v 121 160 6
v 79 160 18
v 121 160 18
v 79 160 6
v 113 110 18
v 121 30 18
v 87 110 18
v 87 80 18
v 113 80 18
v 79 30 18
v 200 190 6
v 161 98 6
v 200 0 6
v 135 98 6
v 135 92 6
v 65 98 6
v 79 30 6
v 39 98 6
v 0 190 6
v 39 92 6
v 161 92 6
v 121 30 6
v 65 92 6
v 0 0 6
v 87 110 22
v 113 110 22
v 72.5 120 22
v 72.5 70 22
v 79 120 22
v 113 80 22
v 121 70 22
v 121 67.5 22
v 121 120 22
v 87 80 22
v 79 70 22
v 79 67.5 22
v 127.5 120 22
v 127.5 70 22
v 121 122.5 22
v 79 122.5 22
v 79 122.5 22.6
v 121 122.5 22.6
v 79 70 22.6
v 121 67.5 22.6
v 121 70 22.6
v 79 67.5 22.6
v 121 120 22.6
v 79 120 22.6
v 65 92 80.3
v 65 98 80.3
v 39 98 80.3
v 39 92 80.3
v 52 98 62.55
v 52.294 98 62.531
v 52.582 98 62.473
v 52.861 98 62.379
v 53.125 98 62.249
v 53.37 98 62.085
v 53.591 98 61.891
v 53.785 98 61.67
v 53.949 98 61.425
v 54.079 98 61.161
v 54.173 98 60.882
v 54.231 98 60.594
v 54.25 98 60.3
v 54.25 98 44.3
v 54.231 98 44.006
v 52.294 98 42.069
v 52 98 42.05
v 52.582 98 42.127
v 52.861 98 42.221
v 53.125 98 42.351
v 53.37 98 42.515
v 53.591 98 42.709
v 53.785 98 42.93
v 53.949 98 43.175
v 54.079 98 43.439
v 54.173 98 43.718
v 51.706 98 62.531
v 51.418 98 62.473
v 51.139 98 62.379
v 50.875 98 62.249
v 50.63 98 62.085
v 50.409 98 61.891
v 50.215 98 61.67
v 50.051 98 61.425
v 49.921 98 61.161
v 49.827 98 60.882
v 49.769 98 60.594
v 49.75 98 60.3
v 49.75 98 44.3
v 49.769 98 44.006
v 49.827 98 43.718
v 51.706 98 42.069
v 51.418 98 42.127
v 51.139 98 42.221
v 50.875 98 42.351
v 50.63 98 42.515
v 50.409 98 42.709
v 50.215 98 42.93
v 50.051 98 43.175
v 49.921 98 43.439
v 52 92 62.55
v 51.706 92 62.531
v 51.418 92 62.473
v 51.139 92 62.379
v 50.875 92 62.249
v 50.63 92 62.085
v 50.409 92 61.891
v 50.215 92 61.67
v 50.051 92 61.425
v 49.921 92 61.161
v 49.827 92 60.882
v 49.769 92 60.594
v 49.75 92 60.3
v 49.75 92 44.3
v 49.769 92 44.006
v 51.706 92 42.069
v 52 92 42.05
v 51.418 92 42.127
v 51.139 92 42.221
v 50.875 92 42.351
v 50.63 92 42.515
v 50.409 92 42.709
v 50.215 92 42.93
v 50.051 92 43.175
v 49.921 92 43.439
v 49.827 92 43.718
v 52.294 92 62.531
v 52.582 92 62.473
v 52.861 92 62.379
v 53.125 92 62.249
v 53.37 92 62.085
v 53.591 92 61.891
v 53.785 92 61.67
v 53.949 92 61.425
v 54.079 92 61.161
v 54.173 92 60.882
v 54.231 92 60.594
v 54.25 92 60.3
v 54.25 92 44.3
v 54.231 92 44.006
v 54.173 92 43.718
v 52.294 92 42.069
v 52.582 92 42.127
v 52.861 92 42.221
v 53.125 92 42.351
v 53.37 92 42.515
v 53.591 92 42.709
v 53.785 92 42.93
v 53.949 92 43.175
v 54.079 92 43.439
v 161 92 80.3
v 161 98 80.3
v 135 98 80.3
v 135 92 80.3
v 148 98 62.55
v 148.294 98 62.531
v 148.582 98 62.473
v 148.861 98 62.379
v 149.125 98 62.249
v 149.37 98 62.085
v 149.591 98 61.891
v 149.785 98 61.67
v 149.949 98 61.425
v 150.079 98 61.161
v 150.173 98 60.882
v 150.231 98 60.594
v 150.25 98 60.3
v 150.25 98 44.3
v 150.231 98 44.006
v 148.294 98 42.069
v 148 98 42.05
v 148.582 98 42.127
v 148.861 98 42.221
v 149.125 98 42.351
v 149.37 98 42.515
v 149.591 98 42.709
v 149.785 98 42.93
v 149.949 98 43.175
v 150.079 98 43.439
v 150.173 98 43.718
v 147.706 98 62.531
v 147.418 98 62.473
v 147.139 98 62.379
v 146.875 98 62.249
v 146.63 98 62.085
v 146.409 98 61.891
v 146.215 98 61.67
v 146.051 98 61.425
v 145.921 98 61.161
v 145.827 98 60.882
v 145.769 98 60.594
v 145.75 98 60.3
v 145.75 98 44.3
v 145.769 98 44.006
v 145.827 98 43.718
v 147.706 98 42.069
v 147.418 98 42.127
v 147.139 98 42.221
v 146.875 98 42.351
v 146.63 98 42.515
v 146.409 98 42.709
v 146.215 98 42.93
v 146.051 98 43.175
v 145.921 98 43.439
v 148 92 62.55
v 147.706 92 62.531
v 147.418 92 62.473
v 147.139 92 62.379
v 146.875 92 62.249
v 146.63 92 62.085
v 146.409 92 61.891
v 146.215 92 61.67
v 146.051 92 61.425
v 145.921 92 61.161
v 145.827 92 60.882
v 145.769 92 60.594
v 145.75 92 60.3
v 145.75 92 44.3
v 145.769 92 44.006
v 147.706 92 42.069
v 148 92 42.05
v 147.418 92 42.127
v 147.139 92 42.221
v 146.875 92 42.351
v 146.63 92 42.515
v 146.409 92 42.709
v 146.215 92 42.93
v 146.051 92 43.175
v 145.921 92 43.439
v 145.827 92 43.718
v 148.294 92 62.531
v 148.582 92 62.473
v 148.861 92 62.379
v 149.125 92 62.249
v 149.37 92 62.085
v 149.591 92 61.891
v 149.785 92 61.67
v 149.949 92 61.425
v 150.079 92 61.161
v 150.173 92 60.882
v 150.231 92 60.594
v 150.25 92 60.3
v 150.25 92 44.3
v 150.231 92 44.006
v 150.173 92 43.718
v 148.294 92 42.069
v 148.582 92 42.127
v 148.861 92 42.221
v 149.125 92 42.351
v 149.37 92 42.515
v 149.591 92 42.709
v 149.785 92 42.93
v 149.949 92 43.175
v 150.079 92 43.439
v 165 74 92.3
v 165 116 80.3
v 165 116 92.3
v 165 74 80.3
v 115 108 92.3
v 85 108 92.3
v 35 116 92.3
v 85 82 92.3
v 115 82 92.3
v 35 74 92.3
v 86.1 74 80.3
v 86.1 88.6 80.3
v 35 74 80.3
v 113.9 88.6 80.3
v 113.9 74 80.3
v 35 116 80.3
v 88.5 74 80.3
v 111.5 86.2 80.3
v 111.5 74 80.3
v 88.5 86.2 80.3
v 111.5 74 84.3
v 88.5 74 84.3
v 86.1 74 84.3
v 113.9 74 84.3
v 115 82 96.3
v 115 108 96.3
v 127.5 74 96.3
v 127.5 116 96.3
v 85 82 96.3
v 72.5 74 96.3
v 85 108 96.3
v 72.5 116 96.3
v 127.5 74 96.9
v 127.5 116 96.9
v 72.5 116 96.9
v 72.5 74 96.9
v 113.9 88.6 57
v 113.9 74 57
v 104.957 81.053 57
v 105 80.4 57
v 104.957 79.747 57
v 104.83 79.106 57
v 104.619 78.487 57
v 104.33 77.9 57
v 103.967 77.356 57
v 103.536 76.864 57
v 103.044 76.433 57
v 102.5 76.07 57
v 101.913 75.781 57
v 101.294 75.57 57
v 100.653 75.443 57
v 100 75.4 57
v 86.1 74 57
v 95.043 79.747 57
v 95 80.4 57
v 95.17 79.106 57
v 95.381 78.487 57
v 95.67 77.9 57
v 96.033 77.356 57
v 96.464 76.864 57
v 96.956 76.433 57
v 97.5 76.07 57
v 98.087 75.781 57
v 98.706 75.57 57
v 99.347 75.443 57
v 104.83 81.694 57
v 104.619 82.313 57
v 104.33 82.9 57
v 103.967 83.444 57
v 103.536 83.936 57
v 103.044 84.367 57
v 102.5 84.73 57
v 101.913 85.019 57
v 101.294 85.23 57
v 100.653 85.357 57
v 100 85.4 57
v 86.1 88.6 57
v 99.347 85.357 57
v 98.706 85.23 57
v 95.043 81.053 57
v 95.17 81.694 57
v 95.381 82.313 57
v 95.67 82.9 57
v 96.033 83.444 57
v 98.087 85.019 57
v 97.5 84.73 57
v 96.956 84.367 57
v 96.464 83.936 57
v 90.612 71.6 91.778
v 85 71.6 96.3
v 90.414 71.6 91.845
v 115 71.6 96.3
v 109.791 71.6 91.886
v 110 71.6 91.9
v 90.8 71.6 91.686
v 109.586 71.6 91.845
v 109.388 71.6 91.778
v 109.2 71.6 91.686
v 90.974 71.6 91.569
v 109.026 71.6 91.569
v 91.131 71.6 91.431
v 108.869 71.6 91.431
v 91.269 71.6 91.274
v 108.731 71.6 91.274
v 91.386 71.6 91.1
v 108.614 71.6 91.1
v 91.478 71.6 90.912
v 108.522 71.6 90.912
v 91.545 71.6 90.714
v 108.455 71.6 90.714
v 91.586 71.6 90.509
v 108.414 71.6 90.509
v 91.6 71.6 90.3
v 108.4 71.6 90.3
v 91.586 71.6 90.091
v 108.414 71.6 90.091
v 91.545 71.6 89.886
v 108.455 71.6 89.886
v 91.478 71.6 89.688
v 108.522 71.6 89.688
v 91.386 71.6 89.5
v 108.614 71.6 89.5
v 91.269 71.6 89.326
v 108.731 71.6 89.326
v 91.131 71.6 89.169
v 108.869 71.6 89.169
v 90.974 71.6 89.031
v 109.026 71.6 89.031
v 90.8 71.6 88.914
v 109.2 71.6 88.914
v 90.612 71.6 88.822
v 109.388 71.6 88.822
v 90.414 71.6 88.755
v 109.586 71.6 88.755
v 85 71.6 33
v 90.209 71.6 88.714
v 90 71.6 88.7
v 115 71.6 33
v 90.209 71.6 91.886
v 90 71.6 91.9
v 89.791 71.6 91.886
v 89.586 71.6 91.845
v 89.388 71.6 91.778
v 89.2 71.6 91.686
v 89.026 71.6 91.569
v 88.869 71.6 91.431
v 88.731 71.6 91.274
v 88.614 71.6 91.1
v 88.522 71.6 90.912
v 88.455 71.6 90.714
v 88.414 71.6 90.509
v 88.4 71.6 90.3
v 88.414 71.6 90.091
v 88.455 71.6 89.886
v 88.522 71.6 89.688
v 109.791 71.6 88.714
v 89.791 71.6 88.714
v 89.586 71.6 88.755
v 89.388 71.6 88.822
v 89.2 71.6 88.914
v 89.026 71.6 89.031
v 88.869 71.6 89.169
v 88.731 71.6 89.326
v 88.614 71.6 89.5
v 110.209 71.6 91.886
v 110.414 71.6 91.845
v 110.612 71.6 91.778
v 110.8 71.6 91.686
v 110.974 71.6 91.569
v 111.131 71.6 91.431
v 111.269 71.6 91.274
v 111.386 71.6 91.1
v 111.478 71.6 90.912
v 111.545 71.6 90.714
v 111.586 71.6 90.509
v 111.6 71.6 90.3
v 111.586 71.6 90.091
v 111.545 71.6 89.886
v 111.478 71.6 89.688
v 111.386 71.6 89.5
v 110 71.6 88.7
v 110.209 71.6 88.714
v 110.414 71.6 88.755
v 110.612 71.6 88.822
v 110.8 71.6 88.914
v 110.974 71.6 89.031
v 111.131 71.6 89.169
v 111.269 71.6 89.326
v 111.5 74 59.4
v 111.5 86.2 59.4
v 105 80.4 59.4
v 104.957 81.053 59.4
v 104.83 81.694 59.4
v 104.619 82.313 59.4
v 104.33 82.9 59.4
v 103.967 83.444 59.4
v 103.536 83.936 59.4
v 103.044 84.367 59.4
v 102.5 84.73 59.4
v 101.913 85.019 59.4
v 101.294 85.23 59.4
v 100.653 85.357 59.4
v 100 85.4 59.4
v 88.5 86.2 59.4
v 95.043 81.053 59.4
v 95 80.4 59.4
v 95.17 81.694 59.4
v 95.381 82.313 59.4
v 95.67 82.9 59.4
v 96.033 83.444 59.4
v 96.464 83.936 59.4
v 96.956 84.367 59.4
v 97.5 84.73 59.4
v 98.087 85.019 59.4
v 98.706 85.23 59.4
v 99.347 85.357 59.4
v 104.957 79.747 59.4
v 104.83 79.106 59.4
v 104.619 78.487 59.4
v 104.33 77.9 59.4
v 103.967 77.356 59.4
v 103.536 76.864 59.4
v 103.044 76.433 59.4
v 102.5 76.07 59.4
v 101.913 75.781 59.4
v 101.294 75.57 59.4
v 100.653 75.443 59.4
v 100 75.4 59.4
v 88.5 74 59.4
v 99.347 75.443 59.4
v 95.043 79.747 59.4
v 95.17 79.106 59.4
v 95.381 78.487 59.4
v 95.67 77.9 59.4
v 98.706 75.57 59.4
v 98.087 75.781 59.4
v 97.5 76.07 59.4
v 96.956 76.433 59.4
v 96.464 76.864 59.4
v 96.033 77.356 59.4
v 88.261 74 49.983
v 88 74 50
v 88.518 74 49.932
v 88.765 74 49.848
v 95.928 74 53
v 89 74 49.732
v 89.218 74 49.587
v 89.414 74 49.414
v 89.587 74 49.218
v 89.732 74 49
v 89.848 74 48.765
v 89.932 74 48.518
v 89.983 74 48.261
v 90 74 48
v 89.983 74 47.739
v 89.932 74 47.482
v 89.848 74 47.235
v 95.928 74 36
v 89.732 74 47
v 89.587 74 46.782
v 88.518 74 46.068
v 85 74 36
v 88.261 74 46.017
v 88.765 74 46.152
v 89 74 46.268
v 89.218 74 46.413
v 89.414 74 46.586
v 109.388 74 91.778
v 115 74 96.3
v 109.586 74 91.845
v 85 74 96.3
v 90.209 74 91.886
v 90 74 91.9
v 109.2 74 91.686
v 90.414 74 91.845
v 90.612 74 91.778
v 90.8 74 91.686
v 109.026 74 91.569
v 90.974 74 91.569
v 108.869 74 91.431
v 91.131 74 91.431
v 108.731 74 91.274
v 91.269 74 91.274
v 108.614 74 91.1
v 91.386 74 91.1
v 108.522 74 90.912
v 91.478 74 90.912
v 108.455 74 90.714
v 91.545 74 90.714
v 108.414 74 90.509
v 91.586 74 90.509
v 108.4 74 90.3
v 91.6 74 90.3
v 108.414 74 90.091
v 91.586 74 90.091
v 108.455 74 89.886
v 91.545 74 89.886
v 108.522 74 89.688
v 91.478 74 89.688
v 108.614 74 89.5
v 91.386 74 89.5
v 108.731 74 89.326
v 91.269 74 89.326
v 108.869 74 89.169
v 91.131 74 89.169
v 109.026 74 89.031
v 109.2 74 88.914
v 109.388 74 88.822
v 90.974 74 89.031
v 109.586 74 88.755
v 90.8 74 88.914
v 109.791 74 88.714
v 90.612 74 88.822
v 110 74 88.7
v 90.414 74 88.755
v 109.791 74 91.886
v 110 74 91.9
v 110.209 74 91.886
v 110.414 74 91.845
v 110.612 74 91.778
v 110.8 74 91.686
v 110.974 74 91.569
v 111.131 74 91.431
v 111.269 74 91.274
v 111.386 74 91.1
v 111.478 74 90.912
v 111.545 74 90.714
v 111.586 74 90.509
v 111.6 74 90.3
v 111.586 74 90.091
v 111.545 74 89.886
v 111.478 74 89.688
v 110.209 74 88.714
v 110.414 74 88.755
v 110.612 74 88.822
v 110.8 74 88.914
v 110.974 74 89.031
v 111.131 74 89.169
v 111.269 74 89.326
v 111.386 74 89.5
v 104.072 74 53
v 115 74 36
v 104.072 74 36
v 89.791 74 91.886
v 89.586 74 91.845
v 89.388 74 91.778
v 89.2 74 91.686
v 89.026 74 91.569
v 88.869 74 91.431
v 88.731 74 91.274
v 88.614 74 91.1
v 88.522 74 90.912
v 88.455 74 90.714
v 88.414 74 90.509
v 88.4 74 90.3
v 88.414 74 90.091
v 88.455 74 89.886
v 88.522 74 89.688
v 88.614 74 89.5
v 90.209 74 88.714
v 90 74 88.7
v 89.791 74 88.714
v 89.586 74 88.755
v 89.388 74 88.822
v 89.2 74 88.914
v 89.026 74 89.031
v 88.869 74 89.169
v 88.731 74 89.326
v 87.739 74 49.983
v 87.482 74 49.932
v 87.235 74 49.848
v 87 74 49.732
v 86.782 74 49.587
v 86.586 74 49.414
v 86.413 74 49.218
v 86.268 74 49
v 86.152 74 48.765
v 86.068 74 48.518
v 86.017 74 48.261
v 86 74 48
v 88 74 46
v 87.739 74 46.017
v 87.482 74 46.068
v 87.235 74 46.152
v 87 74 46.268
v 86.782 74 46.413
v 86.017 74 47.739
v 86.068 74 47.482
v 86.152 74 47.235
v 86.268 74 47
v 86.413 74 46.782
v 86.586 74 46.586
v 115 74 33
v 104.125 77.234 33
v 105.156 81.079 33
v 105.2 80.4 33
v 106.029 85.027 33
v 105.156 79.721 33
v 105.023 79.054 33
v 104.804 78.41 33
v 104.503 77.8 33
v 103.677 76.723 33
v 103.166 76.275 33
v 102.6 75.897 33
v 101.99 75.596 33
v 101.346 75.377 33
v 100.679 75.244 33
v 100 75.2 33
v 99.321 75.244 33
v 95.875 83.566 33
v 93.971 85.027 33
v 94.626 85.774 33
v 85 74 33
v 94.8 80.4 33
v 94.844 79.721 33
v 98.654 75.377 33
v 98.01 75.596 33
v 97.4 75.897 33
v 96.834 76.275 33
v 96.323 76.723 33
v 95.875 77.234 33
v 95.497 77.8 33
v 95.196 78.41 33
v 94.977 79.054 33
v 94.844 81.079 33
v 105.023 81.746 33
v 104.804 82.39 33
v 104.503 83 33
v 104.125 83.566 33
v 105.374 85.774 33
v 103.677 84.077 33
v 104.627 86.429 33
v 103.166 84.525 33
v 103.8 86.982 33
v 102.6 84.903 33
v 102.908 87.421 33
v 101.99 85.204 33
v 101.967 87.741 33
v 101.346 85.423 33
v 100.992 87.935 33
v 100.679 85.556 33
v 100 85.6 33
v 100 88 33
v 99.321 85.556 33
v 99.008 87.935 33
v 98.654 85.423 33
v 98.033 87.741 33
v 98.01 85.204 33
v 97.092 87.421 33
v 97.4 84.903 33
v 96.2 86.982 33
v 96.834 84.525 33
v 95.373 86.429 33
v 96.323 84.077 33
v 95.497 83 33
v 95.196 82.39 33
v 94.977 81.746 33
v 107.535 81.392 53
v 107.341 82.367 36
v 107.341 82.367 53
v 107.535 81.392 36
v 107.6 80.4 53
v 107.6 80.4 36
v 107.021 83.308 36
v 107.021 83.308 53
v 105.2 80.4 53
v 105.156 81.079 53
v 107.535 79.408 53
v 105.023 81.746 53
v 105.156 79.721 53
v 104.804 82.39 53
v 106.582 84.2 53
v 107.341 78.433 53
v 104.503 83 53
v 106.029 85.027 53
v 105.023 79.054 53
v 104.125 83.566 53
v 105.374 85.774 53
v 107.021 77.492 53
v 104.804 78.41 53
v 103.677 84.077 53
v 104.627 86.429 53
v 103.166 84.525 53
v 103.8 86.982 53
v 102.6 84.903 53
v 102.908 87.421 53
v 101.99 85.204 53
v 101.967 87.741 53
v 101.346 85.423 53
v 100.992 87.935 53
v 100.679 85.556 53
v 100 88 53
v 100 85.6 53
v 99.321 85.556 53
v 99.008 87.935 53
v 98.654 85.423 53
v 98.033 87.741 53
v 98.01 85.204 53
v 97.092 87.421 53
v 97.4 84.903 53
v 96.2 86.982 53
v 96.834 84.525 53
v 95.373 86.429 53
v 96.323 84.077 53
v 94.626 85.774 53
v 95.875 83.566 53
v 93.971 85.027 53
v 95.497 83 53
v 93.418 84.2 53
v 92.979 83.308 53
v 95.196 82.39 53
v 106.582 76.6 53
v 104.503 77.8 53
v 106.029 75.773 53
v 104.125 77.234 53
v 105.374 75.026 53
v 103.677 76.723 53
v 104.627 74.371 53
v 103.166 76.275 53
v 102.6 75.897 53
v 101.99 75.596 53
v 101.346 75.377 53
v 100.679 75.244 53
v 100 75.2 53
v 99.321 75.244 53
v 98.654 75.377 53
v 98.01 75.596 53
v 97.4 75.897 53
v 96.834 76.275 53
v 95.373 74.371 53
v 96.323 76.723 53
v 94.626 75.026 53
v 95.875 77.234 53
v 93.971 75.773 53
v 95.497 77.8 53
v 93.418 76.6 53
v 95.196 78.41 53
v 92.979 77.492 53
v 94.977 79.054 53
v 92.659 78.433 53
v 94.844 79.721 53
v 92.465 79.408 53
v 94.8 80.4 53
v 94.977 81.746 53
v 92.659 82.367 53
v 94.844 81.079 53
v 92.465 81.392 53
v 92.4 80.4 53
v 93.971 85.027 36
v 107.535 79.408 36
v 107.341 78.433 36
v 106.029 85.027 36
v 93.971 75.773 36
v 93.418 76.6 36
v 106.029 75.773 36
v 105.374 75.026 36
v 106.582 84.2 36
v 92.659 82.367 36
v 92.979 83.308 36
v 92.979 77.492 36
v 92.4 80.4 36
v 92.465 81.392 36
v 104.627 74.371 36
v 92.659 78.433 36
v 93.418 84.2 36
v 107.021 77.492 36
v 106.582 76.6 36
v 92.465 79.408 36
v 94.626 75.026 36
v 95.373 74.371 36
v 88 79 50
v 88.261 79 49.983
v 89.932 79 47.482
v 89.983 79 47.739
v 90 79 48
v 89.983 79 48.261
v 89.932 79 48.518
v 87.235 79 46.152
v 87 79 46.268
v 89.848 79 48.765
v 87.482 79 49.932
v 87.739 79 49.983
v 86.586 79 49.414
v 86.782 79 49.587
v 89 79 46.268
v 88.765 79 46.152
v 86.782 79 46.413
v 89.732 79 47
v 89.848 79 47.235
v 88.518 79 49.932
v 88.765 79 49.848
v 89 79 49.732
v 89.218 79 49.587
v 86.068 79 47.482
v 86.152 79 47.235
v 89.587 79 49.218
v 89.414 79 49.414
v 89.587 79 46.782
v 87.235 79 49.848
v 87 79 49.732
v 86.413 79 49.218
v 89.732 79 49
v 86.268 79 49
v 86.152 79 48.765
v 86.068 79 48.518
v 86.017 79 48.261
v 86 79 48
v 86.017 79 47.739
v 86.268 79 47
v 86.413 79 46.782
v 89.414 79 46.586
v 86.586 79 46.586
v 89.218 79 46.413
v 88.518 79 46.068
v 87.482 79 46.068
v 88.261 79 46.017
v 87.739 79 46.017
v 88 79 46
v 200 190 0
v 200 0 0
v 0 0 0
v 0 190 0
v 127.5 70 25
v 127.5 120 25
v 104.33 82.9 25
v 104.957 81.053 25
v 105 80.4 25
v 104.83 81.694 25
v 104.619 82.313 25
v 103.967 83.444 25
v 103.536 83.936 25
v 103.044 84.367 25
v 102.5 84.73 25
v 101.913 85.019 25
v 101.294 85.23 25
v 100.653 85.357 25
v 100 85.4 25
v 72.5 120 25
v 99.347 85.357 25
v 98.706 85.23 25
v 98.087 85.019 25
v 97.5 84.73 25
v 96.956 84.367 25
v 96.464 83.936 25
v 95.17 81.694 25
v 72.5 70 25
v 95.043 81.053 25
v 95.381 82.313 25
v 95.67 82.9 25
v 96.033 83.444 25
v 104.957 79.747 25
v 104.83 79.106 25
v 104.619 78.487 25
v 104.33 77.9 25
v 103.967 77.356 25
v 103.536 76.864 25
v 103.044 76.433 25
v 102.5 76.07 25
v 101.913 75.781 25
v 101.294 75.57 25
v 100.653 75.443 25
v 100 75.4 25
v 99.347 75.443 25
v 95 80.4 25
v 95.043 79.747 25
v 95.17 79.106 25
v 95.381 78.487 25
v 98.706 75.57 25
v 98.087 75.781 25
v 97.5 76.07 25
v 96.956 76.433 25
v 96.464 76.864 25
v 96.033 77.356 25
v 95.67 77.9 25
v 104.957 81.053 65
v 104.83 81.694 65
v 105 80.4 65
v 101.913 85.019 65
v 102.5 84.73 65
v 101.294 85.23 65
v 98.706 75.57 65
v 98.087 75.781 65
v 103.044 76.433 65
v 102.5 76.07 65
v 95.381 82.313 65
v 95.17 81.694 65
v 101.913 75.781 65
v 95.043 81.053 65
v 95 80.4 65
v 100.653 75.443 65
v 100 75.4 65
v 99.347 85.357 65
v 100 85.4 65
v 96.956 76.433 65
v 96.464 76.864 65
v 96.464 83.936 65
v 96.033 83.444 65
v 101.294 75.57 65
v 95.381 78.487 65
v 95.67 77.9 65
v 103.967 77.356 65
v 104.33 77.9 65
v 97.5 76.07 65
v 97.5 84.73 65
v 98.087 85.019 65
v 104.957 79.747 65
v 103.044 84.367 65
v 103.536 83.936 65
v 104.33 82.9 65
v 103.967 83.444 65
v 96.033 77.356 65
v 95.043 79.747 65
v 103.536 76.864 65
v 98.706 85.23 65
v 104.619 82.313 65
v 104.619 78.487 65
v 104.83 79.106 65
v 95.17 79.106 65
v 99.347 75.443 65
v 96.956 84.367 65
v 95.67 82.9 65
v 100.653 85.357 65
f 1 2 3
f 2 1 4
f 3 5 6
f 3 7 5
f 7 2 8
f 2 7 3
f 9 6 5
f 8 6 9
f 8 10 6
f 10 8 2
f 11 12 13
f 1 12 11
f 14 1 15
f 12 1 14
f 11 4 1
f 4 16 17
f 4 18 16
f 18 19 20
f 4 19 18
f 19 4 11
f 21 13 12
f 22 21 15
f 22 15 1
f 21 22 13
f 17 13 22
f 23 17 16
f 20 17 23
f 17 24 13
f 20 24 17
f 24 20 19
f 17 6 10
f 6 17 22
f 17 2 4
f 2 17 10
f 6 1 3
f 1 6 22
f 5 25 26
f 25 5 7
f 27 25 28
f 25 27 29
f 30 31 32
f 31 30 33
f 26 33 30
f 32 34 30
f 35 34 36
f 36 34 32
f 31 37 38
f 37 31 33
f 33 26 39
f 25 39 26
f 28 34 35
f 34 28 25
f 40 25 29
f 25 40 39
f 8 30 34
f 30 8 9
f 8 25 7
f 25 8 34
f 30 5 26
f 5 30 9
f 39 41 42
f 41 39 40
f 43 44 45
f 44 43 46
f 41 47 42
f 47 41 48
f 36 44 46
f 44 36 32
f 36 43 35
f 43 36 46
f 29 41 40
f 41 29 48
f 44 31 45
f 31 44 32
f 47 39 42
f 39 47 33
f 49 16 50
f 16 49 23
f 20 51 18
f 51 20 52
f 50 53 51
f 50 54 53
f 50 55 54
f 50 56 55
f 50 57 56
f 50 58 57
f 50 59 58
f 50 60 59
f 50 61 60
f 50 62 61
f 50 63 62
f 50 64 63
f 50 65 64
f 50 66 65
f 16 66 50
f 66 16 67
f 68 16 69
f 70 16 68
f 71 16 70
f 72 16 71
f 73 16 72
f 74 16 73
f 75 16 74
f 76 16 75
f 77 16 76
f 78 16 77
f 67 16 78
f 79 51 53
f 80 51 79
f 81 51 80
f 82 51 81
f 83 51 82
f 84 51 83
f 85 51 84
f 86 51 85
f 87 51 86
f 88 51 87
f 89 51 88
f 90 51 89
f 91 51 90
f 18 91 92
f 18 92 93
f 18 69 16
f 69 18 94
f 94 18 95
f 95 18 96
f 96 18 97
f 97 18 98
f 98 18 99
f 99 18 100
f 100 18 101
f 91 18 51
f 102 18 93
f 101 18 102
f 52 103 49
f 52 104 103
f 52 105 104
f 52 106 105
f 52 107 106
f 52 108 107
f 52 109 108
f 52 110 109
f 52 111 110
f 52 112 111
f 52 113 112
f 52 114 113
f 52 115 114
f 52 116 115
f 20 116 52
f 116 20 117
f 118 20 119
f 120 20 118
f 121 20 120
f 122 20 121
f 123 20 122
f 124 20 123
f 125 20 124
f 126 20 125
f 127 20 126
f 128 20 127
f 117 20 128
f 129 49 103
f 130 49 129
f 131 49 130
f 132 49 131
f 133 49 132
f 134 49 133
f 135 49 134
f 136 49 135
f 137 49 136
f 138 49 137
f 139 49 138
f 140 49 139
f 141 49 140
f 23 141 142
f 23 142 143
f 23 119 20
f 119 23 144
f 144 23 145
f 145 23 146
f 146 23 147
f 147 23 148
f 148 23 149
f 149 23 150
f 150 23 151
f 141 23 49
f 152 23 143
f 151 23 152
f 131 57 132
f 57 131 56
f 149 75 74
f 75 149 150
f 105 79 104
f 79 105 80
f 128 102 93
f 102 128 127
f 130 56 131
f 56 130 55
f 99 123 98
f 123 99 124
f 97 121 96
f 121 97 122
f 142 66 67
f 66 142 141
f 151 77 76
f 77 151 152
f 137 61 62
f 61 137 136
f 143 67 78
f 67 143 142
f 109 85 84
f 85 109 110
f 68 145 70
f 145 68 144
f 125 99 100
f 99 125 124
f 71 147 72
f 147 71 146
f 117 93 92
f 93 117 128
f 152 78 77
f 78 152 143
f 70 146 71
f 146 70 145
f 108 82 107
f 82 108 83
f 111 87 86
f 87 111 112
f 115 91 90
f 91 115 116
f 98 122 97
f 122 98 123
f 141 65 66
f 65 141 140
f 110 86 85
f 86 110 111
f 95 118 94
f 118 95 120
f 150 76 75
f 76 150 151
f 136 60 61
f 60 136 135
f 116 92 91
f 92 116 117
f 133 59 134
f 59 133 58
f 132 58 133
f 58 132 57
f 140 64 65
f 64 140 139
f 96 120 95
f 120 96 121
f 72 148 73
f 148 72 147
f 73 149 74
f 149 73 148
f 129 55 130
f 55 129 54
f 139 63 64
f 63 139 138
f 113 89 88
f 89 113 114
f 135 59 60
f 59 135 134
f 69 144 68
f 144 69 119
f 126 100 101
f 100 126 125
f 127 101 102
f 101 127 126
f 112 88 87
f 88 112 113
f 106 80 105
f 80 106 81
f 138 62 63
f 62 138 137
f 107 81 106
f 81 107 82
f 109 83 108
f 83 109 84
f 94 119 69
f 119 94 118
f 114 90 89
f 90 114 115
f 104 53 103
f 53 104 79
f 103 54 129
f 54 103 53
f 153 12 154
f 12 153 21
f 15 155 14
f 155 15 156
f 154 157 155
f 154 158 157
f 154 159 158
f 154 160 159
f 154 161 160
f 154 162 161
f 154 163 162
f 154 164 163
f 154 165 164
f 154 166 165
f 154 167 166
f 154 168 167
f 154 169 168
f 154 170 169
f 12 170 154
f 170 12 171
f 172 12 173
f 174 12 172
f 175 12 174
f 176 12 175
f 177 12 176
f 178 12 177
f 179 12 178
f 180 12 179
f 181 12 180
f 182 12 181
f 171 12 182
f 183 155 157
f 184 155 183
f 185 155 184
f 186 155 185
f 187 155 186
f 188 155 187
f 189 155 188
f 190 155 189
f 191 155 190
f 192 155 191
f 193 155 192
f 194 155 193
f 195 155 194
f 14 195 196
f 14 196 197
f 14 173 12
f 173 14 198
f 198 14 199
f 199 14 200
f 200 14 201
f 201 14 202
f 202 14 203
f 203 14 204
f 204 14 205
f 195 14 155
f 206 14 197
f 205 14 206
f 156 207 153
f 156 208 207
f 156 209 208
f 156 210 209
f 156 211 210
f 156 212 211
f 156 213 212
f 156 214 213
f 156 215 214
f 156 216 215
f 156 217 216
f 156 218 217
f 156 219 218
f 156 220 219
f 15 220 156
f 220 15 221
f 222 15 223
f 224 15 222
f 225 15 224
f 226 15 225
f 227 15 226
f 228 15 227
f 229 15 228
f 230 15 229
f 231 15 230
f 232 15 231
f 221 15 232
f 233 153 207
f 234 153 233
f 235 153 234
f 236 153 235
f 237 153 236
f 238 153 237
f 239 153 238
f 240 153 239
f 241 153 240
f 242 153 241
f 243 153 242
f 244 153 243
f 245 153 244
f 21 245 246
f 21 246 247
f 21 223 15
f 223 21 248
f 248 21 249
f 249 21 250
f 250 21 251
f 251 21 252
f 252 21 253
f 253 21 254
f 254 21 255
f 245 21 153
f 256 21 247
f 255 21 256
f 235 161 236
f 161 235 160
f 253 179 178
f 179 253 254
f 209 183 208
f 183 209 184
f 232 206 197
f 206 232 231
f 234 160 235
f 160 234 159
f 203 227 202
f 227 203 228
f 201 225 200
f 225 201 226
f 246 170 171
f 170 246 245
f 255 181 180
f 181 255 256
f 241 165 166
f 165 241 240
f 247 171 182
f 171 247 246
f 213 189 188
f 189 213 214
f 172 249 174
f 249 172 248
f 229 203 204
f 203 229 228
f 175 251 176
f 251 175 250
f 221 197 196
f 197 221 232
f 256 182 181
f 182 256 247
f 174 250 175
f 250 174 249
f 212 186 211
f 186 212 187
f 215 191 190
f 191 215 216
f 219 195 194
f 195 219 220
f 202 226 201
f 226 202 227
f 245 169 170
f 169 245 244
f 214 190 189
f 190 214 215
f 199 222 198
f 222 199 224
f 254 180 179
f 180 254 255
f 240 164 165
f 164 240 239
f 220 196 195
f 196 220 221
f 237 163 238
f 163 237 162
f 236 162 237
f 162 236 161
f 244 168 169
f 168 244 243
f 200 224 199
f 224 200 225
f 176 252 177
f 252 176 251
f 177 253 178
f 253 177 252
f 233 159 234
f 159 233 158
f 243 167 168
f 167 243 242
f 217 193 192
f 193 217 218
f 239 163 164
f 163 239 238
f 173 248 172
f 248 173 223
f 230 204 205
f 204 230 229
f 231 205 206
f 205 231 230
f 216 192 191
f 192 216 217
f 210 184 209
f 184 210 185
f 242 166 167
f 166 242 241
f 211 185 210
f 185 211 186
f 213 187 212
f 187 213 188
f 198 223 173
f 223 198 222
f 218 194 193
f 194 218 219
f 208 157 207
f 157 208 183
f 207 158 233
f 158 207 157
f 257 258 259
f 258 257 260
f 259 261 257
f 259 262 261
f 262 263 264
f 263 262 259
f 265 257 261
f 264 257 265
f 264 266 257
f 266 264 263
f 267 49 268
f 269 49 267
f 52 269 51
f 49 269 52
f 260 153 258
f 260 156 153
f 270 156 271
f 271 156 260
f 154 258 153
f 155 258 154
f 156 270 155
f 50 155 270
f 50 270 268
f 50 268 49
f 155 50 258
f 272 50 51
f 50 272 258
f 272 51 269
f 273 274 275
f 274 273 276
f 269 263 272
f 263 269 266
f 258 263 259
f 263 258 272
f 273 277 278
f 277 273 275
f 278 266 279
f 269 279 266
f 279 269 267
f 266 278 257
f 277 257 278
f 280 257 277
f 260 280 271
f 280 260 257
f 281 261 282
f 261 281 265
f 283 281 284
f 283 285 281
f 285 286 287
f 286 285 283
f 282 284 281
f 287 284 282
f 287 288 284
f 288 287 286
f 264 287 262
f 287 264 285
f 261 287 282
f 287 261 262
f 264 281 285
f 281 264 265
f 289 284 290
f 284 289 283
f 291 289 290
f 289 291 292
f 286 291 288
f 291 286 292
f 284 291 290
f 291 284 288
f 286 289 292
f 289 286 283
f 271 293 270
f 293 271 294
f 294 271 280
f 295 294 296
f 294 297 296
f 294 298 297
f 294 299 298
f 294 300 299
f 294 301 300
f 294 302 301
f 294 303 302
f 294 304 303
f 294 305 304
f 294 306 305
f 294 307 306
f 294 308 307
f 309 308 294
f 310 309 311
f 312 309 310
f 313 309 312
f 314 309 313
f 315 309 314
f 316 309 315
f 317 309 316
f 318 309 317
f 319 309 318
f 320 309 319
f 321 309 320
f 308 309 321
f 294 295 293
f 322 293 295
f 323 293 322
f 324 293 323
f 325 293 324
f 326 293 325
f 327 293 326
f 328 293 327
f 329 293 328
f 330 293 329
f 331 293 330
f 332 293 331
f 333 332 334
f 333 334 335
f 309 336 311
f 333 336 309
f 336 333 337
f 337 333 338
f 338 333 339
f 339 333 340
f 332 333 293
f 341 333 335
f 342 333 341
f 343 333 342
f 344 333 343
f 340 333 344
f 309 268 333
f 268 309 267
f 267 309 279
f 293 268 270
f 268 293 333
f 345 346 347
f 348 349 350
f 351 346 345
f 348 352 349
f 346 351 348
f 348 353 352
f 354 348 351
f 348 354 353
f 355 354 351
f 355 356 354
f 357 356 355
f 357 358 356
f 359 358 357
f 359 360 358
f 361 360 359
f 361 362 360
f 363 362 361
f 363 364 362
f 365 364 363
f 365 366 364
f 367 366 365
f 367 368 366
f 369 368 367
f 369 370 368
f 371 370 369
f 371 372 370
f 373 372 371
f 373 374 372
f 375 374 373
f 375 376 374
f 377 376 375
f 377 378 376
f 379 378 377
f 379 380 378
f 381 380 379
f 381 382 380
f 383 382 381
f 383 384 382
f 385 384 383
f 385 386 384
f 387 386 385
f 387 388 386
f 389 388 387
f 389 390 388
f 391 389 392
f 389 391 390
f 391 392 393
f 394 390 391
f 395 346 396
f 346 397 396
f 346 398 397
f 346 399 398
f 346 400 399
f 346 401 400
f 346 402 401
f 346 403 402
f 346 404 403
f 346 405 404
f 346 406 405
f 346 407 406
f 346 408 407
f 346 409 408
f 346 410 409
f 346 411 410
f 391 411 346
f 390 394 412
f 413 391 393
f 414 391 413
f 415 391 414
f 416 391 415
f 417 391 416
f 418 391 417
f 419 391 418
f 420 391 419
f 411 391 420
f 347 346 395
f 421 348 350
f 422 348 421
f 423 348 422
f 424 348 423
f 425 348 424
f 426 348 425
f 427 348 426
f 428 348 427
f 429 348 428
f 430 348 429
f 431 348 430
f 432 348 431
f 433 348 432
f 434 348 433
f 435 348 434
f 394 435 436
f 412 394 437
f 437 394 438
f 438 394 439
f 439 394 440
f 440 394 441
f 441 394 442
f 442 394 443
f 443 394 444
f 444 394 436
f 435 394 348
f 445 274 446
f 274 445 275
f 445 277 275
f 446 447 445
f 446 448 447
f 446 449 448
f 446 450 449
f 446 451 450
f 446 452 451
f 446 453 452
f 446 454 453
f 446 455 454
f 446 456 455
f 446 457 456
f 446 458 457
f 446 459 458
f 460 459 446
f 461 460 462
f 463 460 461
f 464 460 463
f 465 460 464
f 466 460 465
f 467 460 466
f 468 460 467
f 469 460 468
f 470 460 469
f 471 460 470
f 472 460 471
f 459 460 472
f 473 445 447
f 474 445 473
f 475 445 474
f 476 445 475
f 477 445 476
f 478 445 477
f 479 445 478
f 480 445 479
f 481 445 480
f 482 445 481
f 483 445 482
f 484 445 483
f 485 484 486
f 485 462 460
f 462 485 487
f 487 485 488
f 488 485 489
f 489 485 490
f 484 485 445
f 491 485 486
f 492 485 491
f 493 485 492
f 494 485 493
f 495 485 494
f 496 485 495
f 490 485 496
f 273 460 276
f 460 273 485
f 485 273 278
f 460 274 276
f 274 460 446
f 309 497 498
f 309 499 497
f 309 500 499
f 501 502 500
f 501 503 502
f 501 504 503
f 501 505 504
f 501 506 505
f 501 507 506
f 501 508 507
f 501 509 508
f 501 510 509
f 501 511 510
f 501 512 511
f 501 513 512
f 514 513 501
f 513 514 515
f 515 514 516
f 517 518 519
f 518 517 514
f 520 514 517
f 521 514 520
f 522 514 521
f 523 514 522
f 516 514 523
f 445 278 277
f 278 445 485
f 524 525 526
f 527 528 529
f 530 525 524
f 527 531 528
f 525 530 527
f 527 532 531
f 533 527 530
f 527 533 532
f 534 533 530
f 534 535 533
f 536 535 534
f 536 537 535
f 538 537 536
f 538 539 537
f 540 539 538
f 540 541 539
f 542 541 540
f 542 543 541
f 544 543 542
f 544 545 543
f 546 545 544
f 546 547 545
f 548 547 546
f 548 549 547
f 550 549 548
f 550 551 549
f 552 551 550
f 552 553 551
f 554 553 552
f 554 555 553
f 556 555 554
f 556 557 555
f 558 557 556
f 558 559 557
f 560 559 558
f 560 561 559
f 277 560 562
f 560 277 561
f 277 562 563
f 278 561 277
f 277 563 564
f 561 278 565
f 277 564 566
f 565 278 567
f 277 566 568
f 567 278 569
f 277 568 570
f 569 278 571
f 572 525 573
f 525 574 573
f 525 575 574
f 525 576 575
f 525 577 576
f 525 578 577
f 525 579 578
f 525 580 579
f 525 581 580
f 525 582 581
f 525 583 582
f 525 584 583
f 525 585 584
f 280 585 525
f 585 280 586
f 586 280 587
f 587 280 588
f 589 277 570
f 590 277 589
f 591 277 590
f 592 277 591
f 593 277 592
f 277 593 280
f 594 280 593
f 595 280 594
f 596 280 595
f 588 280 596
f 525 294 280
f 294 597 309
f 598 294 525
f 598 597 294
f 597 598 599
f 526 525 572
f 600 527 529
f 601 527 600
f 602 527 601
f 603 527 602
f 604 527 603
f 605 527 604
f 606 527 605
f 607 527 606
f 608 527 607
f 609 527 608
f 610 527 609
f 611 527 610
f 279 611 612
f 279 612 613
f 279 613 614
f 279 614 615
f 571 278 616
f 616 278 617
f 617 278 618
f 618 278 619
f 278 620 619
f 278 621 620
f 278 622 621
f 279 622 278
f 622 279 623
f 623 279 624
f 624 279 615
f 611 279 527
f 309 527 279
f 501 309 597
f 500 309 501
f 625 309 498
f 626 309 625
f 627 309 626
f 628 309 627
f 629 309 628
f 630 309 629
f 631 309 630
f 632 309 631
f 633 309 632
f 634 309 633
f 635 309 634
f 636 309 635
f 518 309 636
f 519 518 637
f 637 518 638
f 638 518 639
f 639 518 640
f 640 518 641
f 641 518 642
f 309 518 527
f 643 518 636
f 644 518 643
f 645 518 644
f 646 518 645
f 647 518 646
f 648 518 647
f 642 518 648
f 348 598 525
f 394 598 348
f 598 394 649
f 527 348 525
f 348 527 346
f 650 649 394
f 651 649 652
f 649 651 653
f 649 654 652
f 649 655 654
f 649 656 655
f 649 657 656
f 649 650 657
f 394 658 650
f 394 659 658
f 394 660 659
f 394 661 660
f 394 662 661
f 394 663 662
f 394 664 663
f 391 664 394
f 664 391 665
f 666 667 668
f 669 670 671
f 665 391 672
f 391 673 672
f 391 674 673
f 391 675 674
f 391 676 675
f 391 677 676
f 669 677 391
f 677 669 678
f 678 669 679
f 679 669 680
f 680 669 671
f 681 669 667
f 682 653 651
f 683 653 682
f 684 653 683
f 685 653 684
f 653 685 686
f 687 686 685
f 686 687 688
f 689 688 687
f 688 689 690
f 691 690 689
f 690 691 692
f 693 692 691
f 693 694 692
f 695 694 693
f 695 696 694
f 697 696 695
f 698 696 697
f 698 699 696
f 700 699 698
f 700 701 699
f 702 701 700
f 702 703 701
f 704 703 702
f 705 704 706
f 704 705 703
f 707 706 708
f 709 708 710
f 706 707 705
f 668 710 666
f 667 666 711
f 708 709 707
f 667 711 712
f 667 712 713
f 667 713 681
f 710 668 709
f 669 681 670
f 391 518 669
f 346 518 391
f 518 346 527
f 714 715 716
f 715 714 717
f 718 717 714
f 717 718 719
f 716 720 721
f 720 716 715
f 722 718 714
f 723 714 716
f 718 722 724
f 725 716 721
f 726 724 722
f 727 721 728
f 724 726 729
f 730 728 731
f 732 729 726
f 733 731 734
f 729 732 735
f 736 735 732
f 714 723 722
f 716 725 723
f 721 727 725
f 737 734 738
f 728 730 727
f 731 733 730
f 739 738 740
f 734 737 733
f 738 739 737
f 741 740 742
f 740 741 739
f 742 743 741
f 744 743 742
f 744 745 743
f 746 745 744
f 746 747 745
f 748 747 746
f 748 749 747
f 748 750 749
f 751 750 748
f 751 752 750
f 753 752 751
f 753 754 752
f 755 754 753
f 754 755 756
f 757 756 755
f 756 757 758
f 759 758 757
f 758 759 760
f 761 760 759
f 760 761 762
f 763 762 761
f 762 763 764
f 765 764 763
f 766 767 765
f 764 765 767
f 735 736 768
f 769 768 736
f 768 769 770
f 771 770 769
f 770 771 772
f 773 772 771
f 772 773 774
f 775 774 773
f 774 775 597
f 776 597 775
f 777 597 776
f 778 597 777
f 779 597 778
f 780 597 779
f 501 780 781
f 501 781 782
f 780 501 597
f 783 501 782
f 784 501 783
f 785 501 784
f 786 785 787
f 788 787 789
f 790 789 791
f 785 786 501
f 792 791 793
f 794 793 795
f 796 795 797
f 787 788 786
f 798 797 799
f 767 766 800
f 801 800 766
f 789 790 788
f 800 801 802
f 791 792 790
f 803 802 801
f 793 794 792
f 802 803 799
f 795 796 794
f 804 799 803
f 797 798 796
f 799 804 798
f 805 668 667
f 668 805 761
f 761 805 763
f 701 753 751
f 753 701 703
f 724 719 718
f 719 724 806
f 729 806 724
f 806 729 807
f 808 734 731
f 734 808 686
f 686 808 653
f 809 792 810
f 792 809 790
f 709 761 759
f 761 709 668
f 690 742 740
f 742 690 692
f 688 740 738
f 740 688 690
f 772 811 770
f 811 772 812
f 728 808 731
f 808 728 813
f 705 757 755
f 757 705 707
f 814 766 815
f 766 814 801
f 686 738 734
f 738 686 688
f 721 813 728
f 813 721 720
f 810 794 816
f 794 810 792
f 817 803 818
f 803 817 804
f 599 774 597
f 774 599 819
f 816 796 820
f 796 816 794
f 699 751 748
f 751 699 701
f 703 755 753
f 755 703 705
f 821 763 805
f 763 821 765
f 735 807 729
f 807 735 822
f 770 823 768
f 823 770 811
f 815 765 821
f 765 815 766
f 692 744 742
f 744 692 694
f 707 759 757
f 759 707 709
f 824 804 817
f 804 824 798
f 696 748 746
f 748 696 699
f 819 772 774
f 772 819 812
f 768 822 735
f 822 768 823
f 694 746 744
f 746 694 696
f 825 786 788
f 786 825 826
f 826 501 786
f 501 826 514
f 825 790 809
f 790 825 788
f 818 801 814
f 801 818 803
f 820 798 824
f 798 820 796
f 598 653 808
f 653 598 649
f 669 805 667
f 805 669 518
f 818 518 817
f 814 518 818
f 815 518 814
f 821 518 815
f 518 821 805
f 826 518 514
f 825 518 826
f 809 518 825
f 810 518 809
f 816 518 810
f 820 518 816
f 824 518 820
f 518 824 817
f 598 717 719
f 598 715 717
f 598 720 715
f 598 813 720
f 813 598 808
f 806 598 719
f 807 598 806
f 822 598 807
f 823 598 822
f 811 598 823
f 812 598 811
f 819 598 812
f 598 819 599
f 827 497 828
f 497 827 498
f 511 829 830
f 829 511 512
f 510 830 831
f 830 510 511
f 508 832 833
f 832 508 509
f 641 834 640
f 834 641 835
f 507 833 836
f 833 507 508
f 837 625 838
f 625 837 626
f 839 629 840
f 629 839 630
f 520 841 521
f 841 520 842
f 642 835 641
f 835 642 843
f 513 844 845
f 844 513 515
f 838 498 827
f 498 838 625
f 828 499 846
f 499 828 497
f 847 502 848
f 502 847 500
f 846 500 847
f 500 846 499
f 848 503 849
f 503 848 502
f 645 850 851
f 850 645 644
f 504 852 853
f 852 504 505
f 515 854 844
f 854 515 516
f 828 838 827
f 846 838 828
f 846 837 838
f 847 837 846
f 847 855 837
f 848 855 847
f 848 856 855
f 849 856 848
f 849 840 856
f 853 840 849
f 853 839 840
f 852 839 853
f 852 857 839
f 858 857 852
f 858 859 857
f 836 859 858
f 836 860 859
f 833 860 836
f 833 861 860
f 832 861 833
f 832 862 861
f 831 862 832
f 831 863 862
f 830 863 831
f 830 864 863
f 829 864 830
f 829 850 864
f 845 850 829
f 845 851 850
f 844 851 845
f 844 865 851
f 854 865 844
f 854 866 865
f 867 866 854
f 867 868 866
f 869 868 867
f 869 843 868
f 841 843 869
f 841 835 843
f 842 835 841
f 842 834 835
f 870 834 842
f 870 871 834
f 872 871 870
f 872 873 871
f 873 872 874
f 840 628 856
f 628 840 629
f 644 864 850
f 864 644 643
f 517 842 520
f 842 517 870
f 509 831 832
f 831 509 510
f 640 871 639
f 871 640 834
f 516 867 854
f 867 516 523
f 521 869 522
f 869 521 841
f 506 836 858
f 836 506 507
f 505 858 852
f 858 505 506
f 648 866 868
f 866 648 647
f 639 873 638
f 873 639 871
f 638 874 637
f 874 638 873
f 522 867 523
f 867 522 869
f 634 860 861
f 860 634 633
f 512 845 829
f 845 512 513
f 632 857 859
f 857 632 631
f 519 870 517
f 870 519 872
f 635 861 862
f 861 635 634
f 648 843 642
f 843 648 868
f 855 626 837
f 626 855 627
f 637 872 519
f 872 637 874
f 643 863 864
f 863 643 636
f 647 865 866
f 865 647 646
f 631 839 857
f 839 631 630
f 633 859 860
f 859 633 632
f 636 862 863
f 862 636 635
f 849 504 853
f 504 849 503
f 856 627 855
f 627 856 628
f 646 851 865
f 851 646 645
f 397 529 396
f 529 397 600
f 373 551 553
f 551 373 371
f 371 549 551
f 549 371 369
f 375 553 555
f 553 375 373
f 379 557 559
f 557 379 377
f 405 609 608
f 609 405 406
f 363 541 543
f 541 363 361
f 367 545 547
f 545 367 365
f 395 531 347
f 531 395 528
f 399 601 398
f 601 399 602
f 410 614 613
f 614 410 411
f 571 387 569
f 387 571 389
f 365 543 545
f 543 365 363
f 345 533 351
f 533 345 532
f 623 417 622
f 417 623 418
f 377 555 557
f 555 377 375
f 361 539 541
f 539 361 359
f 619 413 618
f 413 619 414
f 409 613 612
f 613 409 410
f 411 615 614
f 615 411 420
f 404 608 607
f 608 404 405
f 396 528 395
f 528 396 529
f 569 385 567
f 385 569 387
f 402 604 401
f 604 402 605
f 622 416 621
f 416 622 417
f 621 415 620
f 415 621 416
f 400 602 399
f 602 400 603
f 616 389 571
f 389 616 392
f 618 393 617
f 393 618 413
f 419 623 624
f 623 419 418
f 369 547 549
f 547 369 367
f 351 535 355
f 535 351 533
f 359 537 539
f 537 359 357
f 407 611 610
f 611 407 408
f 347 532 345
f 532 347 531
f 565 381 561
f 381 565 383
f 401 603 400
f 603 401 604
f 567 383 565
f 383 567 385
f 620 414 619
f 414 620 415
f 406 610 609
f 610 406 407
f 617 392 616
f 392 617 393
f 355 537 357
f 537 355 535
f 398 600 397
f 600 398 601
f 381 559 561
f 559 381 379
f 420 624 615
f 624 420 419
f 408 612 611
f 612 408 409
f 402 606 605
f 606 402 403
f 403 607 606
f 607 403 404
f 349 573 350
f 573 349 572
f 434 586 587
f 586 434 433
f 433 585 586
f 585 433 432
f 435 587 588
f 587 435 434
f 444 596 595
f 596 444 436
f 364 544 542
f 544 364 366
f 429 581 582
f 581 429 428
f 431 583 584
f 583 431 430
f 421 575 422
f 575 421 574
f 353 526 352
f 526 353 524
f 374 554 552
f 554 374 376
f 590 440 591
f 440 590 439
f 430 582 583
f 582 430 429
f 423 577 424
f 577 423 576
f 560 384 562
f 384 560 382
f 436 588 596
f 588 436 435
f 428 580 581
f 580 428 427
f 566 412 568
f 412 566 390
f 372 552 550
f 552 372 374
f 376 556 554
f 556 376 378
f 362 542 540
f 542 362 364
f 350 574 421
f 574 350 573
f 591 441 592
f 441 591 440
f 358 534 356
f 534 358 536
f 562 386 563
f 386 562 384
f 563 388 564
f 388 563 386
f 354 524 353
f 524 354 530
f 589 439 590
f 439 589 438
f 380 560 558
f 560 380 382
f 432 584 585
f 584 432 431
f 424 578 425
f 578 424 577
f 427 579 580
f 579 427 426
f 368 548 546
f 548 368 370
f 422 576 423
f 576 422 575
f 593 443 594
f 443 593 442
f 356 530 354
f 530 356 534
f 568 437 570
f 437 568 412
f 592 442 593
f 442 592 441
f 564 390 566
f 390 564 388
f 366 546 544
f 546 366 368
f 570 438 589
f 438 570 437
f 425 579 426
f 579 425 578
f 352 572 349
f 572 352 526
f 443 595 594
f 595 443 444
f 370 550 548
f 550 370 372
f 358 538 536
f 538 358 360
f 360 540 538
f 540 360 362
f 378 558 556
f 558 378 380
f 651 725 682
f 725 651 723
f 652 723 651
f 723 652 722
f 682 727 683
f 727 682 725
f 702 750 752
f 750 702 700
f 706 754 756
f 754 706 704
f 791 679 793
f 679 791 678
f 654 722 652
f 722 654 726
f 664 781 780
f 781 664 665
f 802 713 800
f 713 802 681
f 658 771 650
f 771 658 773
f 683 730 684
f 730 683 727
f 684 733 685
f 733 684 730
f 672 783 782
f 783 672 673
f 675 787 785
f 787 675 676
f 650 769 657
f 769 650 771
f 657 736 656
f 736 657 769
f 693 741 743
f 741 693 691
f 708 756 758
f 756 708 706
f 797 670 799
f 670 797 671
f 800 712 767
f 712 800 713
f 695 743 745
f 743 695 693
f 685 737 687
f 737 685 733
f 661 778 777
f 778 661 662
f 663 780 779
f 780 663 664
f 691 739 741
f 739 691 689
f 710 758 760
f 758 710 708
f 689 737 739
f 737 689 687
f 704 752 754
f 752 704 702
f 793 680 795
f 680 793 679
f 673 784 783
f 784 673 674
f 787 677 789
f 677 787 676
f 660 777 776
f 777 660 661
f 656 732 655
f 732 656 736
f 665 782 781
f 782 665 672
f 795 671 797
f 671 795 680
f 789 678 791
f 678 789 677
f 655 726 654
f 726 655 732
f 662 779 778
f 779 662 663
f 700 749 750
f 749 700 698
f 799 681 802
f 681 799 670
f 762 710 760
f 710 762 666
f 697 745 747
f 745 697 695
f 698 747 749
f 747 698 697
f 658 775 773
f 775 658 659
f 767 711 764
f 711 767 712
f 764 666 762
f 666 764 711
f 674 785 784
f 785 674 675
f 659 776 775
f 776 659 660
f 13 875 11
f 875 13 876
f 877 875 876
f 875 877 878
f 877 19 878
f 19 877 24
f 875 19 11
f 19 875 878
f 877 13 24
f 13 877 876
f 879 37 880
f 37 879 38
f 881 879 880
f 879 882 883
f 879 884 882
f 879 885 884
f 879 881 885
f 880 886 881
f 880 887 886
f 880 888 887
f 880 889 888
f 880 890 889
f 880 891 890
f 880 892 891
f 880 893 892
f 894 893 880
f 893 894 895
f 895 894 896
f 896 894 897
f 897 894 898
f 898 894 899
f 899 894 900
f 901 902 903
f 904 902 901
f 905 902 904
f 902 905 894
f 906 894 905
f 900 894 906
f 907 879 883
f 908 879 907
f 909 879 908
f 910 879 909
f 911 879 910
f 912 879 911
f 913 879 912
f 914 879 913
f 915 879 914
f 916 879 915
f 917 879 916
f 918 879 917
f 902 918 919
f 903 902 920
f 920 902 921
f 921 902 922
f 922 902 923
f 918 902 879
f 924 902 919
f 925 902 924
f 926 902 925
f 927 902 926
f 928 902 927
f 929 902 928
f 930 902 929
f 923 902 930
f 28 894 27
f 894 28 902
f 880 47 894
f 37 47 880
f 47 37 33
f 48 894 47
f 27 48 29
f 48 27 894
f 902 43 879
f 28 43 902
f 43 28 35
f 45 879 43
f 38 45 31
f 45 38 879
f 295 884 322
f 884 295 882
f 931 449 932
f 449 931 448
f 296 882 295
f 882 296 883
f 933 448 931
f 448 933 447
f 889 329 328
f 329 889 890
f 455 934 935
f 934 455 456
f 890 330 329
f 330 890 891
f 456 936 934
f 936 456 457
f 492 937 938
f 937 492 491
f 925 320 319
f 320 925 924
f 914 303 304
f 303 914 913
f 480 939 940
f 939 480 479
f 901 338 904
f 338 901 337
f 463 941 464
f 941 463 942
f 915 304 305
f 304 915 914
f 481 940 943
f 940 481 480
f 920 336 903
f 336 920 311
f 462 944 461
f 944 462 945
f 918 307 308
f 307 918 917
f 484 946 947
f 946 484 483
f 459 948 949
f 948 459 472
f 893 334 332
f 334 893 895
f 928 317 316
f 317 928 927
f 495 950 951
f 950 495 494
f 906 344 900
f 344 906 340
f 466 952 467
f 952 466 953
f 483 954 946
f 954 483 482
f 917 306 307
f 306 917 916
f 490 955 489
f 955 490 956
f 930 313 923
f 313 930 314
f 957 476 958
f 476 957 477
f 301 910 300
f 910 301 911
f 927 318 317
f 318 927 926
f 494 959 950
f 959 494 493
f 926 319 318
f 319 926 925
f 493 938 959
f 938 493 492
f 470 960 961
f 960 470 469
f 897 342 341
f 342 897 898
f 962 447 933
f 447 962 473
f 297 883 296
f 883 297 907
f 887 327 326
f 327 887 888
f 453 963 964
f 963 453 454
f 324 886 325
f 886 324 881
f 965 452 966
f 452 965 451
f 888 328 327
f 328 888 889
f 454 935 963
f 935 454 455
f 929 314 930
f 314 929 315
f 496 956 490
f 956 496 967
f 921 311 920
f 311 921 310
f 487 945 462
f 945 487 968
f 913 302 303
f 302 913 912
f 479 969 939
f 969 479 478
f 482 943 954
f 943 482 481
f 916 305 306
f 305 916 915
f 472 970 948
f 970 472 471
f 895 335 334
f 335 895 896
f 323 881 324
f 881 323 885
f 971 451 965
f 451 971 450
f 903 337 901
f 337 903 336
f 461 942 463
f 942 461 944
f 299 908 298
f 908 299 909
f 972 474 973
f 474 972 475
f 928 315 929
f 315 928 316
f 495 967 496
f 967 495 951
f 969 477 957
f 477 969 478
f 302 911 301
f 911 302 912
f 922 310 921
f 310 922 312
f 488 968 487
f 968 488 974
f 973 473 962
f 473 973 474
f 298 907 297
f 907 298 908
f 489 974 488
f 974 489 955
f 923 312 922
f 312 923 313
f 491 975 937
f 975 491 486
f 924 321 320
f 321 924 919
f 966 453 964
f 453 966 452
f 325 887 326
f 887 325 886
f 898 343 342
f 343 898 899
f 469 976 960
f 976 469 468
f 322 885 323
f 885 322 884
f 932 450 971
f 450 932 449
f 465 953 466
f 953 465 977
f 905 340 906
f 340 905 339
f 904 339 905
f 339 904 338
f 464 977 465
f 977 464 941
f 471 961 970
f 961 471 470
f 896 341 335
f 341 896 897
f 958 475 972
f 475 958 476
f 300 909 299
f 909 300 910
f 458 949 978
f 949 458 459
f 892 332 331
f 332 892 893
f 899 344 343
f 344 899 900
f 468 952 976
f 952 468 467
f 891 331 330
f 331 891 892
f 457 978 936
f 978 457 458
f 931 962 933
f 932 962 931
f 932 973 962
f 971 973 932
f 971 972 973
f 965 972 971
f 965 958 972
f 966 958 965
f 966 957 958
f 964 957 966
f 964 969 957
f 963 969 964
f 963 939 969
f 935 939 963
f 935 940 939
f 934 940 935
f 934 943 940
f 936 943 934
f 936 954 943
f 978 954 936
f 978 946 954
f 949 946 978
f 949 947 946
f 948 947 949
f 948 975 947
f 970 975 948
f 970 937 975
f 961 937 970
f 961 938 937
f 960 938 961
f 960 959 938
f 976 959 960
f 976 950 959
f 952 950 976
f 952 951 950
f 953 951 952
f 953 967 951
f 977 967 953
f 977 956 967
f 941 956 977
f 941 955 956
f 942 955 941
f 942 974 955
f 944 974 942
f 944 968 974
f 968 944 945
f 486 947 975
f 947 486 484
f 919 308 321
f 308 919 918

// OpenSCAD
// Parametric frame for the ESP32 / DVD-drive pen plotter.
//
// Every dimension below is a starting estimate. Measure your own salvaged
// sleds and edit the values before cutting or printing anything.
//
//   openscad -D 'part="assembly"' -o out.png  cad/plotter.scad
//   openscad -D 'part="pen_lift"' -o pen.stl  cad/plotter.scad

part = "assembly"; // [assembly, pen_lift, paper_bed, gantry_upright]

/* [Measured DVD sled] */
sled_length      = 130;  // full length of the salvaged metal chassis
sled_width       = 42;
sled_height      = 12;
// Measured on this build: X travel ≈ 55 mm, Y ≈ 50 mm (see FINDINGS.md).
sled_travel_x    = 55;
sled_travel_y    = 50;
sled_travel      = sled_travel_x;  // legacy alias used by older layout code
carriage_length  = 30;
carriage_width   = 26;

/* [Frame] */
base_x           = 200;
base_y           = 190;
base_thickness   = 6;
upright_thickness = 6;
upright_width    = 26;

/* [Paper bed] — matches measured usable area */
bed_x            = 55;
bed_y            = 50;
bed_thickness     = 3;

/* [SG90 servo] */
servo_body_x     = 23.0;
servo_body_y     = 12.2;
servo_body_z     = 22.5;
servo_tab_span   = 32.5;
servo_tab_z      = 4.0;
servo_tab_thick  = 2.5;

/* [Pen] */
pen_diameter     = 10.0;
pen_clearance    = 0.4;
pen_plate_x      = 30;   // bracket back plate width
pen_tube_height  = 20;   // vertical guide the pen slides in
pen_gap          = 8;    // guide sits this far above the paper
pen_mount_zone   = 12;   // clear strip at the top for the carriage screws

/* [Print] */
wall             = 2.4;
$fn              = 48;

// Bracket geometry, derived so the three zones cannot overlap: guide tube at
// the bottom, servo cradle above it, bare screw strip at the top.
pen_bore     = pen_diameter + pen_clearance;
pen_axis_x   = pen_plate_x / 2;
// Sunk half a wall into the plate. Sitting it exactly against the face would
// make the tube tangent to the plate, which is not a manifold solid.
pen_axis_y   = wall / 2 + (pen_bore + 2 * wall) / 2;
cradle_h     = servo_body_z + 2 * wall;
cradle_z     = pen_tube_height + 4;
pen_plate_z  = cradle_z + cradle_h + pen_mount_zone;

// Height of the paper surface above the table.
bed_top          = base_thickness + sled_height + 4 + bed_thickness;
// The bracket bolts to the top of the X carriage and hangs down, so the rail
// height follows from the bracket rather than being guessed. Solving for
// "guide bottom sits pen_gap above the paper" keeps the two consistent when
// any sled dimension is edited.
carriage_top_off = sled_height + 4;
gantry_height    = bed_top + pen_plate_z + pen_gap - carriage_top_off;
carriage_top     = gantry_height + carriage_top_off;

module sled(travel_marker = false) {
    color("#9aa4ad") cube([sled_length, sled_width, sled_height]);
    color("#3d6fd8")
        translate([(sled_length - carriage_length) / 2,
                   (sled_width - carriage_width) / 2,
                   sled_height])
        cube([carriage_length, carriage_width, 4]);
    if (travel_marker)
        color("#d8a13d", 0.35)
            translate([(sled_length - sled_travel) / 2, 0, sled_height + 4])
            cube([sled_travel, sled_width, 0.6]);
}

module base_plate() {
    color("#c8b48a") cube([base_x, base_y, base_thickness]);
}

// Deliberately solid: paper needs continuous support right to the edges.
module paper_bed() {
    cube([bed_x, bed_y, bed_thickness]);
}

module gantry_upright() {
    difference() {
        cube([upright_width, upright_thickness, gantry_height]);
        // Slot lets the gantry height be trimmed after the bed is measured.
        translate([upright_width / 2, -1, gantry_height - 26])
            rotate([-90, 0, 0])
            hull() {
                cylinder(d = 4.5, h = upright_thickness + 2);
                translate([0, 16, 0]) cylinder(d = 4.5, h = upright_thickness + 2);
            }
    }
}

// Bracket that bolts to the X carriage. The pen slides vertically in a guide
// tube; a rubber band pulls it down onto the paper and the servo horn pushes
// a collar on the pen upward to lift it. Origin is the bottom of the guide.
module pen_lift() {
    difference() {
        union() {
            cube([pen_plate_x, wall, pen_plate_z]);

            // Guide tube, braced back to the plate.
            translate([pen_axis_x, pen_axis_y, 0])
                cylinder(d = pen_bore + 2 * wall, h = pen_tube_height);
            hull() {
                translate([pen_axis_x, pen_axis_y, 0])
                    cylinder(d = pen_bore + 2 * wall, h = 3);
                cube([pen_plate_x, wall, 3]);
            }

            // Servo cradle. Starts inside the plate so the union is solid
            // rather than two bodies meeting on a shared face.
            translate([(pen_plate_x - servo_body_x) / 2 - wall, 0, cradle_z])
                difference() {
                    cube([servo_body_x + 2 * wall,
                          wall + servo_body_y + wall,
                          cradle_h]);
                    translate([wall, wall, wall])
                        cube([servo_body_x, servo_body_y, cradle_h]);
                }

            // Rubber-band anchor, rooted in the plate so it is not a
            // free-floating body.
            translate([3, 0, pen_tube_height - 5])
                rotate([-90, 0, 0]) cylinder(d = 4, h = wall + 5);
        }

        // Pen bore, open top and bottom so the pen can protrude.
        translate([pen_axis_x, pen_axis_y, -1])
            cylinder(d = pen_bore, h = pen_tube_height + 2);

        // Mounting holes onto the DVD carriage, in the clear top strip.
        for (x = [5, pen_plate_x - 5])
            translate([x, -1, pen_plate_z - pen_mount_zone / 2])
                rotate([-90, 0, 0]) cylinder(d = 3.2, h = wall + 2);
    }
}

// The two axes must be perpendicular: the Y sled runs front-to-back carrying
// the paper, the X sled runs left-to-right overhead carrying the pen.
y_sled_x0 = (base_x - sled_width) / 2;
y_sled_y0 = (base_y - sled_length) / 2;
x_sled_x0 = (base_x - sled_length) / 2;
x_sled_y0 = (base_y - sled_width) / 2;

module assembly() {
    base_plate();

    // Y axis, long axis along Y.
    translate([y_sled_x0 + sled_width, y_sled_y0, base_thickness])
        rotate([0, 0, 90]) sled(travel_marker = true);
    translate([(base_x - bed_x) / 2, (base_y - bed_y) / 2,
               base_thickness + sled_height + 4])
        color("#f2efe6") paper_bed();

    // Uprights stand under the two ends of the X rail, and must clear the
    // full width of the Y sled between them.
    for (x = [x_sled_x0 + 4, x_sled_x0 + sled_length - upright_width - 4])
        translate([x, (base_y - upright_thickness) / 2, base_thickness])
            color("#c8b48a") gantry_upright();

    // X axis, long axis along X, sitting on the uprights.
    translate([x_sled_x0, x_sled_y0, gantry_height])
        sled(travel_marker = true);

    // Pen bracket bolts to the X carriage and hangs toward the operator.
    translate([base_x / 2 - pen_plate_x / 2, x_sled_y0 - wall,
               carriage_top - pen_plate_z])
        color("#4fb06a") pen_lift();

    // The pen itself, shown reaching the paper.
    color("#22252b")
        translate([base_x / 2, x_sled_y0 - wall + pen_axis_y, bed_top])
        cylinder(d = pen_diameter, h = pen_gap + pen_tube_height + 12);
}

if      (part == "assembly")        assembly();
else if (part == "pen_lift")        pen_lift();
else if (part == "paper_bed")       paper_bed();
else if (part == "gantry_upright")  gantry_upright();
